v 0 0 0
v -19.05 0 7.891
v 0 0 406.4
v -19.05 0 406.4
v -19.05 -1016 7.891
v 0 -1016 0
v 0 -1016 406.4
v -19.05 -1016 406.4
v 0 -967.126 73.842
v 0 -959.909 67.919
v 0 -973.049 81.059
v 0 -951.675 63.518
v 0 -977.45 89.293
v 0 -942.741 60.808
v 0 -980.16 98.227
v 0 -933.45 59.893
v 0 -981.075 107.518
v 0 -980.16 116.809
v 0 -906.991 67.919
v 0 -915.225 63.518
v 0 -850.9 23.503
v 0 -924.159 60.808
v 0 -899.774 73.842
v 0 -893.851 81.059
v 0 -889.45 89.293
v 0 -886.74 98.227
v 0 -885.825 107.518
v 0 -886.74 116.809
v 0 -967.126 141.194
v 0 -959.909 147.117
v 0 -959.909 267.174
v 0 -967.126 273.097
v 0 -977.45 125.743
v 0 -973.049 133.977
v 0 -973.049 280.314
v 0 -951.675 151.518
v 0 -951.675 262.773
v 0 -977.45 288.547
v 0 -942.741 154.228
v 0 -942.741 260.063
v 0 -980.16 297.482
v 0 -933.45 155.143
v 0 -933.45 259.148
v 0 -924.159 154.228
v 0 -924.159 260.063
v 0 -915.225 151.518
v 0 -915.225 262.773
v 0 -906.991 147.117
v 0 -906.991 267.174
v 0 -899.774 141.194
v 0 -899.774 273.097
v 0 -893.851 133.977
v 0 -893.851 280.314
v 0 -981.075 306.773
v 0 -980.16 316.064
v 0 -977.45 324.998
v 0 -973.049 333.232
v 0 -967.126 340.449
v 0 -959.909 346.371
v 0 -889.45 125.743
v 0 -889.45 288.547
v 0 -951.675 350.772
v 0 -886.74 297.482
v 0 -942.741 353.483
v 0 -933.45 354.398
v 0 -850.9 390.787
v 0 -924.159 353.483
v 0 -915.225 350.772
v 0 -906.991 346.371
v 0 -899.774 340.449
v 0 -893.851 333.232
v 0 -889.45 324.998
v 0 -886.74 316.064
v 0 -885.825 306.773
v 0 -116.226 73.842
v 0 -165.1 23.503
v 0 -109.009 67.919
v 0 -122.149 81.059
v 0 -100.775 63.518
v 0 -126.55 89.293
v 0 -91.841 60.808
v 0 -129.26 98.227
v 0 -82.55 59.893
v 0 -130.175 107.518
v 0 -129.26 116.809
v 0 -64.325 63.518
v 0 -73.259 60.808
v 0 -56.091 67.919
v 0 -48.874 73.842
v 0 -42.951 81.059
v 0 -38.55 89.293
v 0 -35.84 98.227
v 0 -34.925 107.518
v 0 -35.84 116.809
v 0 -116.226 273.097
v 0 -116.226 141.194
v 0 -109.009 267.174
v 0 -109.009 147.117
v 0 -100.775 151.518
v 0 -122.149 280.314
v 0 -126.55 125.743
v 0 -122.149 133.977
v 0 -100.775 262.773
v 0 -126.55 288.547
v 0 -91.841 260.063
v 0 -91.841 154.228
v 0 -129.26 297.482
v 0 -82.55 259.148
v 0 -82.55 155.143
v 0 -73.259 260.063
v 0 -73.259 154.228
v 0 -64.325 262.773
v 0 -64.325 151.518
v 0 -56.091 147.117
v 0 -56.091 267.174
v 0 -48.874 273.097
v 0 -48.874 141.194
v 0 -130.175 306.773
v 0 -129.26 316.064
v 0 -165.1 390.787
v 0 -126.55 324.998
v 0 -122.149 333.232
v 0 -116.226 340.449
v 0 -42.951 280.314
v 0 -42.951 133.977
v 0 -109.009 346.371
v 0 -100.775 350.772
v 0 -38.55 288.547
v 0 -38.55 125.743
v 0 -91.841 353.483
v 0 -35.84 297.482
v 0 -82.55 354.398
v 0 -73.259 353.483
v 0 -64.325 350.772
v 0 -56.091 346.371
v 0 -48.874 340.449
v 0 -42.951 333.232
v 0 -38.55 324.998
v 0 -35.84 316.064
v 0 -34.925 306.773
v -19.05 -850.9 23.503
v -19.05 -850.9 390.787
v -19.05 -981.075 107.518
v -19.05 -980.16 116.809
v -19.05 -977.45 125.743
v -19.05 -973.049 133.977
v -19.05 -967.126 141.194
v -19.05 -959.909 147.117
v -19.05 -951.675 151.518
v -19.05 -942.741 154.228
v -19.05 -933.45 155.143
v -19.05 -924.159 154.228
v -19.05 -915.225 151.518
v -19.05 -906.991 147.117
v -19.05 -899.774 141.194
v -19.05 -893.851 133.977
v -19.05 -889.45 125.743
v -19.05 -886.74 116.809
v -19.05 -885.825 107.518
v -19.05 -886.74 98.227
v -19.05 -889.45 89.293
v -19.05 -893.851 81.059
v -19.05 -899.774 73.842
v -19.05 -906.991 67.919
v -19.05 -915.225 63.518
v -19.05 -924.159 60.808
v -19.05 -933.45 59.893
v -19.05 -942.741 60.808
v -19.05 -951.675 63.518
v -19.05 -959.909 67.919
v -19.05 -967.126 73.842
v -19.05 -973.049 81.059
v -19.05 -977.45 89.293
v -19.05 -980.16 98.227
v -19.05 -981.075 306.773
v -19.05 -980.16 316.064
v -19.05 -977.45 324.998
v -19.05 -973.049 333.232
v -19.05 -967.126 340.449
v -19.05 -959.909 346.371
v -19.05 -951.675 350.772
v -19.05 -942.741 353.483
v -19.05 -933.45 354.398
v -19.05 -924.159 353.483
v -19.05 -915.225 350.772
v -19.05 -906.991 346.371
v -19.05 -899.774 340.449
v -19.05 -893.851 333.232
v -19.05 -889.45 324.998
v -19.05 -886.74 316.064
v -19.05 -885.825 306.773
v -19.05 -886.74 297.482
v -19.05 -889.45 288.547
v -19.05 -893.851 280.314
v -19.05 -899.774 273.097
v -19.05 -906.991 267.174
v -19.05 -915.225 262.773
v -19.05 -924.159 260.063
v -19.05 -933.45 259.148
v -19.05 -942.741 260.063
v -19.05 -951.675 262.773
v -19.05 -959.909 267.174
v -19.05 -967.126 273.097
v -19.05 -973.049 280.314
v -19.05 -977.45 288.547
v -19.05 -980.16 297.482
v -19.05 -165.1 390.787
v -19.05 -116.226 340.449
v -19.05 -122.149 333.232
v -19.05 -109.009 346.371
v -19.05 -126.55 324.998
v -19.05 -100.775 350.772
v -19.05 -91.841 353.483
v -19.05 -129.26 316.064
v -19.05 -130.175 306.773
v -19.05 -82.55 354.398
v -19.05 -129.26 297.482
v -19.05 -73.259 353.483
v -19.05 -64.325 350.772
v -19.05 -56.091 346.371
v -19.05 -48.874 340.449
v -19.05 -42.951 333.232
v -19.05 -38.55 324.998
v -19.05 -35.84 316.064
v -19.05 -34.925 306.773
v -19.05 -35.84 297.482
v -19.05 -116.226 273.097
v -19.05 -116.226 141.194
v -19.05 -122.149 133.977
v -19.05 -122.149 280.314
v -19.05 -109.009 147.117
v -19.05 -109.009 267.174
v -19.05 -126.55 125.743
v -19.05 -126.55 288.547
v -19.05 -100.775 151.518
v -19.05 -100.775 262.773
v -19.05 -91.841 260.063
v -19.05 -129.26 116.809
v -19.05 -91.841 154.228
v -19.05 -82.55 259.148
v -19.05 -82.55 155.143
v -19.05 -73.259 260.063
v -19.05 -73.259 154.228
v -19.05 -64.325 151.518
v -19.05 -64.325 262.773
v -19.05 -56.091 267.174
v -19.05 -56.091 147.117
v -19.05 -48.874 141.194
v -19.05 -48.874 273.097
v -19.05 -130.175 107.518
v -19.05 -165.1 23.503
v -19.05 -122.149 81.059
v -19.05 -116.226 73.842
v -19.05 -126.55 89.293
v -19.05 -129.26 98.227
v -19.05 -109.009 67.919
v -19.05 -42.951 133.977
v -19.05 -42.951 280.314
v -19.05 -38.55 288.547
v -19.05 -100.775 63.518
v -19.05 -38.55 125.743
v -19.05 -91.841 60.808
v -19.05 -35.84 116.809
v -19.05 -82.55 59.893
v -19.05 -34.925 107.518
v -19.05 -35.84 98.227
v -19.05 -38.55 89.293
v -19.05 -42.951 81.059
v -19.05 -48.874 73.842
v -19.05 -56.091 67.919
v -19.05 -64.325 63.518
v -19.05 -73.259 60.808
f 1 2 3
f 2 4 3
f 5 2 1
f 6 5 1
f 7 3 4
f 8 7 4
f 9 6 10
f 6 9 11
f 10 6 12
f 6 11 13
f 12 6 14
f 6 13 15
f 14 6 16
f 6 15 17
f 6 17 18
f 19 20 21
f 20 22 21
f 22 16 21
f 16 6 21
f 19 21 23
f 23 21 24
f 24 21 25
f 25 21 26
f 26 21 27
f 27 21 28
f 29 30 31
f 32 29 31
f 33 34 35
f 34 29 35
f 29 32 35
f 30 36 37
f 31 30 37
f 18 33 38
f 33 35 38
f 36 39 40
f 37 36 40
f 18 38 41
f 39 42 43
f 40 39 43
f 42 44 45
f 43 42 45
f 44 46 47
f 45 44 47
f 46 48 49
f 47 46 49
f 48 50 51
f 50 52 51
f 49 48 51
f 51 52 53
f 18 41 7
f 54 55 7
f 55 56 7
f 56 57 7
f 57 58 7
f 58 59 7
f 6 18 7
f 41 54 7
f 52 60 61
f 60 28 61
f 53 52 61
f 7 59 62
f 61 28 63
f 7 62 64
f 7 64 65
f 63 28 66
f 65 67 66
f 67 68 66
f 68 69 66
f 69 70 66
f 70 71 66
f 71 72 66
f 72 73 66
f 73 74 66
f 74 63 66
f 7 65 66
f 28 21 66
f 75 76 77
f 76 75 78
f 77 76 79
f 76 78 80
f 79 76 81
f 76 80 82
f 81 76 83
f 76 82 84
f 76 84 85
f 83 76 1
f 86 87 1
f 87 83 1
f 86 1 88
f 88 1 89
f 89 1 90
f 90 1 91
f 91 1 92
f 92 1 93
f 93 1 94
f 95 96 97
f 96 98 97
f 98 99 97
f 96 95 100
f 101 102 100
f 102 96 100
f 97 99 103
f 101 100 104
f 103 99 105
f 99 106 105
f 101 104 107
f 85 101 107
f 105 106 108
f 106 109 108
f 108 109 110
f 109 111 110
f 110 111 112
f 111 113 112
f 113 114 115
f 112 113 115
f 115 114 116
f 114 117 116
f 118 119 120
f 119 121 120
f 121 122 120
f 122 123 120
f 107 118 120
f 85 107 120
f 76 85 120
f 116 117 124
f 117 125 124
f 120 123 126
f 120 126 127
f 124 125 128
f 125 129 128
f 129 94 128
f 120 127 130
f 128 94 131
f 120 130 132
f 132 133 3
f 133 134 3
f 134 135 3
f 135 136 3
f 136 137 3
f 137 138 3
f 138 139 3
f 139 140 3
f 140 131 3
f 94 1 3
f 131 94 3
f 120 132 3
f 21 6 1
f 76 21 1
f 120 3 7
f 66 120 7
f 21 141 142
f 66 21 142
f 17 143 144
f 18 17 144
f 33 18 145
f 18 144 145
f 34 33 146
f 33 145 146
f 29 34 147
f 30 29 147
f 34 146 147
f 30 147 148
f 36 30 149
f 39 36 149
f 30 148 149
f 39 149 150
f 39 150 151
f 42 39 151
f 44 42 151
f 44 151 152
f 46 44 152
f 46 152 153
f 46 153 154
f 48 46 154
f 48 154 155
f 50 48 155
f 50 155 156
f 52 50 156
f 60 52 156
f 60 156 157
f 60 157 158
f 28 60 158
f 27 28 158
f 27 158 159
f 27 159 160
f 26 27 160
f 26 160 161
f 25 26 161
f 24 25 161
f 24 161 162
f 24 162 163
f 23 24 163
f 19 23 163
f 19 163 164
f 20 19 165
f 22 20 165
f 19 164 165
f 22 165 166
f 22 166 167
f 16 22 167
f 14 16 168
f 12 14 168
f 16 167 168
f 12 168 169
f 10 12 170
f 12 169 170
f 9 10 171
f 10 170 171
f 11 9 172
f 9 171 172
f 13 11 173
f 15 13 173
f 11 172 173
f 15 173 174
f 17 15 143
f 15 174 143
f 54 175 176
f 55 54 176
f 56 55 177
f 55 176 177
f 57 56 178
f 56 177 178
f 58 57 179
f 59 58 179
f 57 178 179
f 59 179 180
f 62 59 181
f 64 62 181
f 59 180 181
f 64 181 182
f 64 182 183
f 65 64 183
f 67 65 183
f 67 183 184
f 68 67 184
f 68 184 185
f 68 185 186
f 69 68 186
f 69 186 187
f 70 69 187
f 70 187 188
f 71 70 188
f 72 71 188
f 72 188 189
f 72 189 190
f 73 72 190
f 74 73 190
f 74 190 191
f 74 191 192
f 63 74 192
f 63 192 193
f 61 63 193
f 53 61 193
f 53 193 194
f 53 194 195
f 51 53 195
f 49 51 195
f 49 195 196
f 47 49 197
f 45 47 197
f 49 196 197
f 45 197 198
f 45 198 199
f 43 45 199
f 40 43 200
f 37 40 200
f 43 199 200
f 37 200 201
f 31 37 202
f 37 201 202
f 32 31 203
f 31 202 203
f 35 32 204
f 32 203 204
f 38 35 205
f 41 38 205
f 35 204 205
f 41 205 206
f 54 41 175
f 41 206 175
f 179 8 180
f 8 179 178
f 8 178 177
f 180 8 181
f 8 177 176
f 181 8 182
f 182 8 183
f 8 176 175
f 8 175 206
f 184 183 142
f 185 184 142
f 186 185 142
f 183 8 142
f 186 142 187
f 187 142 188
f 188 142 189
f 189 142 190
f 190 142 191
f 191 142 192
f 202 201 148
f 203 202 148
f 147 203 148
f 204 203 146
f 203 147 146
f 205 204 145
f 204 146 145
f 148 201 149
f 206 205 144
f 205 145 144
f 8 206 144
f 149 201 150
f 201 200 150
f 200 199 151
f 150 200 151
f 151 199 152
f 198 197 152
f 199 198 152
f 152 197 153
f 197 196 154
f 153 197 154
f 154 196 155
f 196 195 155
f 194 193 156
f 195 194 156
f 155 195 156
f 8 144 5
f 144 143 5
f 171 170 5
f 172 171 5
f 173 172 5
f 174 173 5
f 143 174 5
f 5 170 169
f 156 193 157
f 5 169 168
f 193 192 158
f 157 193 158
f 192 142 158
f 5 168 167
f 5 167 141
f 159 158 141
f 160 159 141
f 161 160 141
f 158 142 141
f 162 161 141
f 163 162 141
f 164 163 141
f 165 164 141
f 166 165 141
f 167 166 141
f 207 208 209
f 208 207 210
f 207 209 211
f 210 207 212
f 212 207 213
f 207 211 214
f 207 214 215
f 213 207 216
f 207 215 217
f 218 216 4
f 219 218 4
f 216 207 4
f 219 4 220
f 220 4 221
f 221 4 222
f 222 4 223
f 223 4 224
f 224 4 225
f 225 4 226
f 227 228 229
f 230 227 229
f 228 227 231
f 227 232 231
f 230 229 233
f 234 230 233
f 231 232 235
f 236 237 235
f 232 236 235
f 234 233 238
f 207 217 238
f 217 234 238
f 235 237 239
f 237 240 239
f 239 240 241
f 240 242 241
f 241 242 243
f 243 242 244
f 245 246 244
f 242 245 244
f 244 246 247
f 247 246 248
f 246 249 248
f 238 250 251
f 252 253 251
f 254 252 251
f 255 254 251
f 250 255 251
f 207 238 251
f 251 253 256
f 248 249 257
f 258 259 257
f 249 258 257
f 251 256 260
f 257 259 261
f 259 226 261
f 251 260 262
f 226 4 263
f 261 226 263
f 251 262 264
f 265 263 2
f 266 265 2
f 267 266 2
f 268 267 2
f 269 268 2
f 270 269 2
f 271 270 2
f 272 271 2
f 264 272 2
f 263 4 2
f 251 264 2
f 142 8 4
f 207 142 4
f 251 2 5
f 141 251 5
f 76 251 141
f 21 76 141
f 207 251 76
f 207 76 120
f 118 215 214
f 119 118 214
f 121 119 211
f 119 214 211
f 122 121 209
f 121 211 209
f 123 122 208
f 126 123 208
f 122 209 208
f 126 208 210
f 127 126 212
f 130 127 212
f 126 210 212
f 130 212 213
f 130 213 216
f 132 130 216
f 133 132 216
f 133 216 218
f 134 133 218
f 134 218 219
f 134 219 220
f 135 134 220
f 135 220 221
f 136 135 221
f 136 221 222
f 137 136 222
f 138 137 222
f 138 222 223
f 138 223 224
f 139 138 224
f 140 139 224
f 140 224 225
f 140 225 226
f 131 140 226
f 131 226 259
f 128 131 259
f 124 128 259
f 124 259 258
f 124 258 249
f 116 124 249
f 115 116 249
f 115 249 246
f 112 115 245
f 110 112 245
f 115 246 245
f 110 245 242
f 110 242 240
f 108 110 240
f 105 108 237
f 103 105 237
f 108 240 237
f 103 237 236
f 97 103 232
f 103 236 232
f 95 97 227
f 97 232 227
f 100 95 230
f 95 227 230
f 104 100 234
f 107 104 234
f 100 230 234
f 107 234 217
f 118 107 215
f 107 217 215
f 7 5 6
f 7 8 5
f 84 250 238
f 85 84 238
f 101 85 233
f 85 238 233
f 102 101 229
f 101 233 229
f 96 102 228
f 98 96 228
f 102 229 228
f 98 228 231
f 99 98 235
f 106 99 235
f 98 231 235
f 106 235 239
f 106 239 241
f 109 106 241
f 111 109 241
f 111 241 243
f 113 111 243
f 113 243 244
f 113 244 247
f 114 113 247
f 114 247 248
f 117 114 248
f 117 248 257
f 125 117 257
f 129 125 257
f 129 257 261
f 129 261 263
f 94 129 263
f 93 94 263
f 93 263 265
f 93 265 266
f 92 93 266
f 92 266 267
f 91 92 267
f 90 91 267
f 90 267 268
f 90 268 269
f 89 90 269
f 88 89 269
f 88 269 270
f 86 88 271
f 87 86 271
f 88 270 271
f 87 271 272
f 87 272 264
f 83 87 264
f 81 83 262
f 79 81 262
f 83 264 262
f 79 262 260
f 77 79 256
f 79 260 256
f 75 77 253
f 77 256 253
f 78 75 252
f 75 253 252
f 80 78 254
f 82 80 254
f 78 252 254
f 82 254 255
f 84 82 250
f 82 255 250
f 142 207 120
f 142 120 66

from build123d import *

# Parameters (mm, degrees)
F1_DEPTH = 1016
F2_W     = 685.8
F2_H     = 367.284
F3_DEPTH = 19.051
F4_R     = 47.625
F5_DEPTH = 19.051


with BuildPart() as f1:
    # F0 (on Front) → F1 (new body)
    with BuildSketch(Plane.XZ):
        Polygon((-19.05, 7.890768), (0, 0), (0, 406.4), (-19.05, 406.4), align=None)
    extrude(amount=F1_DEPTH)

    # F2 (on face) → F3 (cut, through all)
    with BuildSketch(Plane(origin=(-19.05, 0, 0), x_dir=(0, -1, 0), z_dir=(-1, 0, 0))):
        with Locations((508, 207.145384)):
            Rectangle(F2_W, F2_H)
    extrude(amount=-F3_DEPTH, mode=Mode.SUBTRACT)

    # F4 (on face) → F5 (cut, through all)
    with BuildSketch(Plane(origin=(-19.05, 0, 0), x_dir=(0, -1, 0), z_dir=(-1, 0, 0))):
        with Locations((82.55, 306.772692)):
            Circle(F4_R)
        with Locations((82.55, 107.518076)):
            Circle(F4_R)
        with Locations((933.45, 306.772692)):
            Circle(F4_R)
        with Locations((933.45, 107.518076)):
            Circle(F4_R)
    extrude(amount=-F5_DEPTH, mode=Mode.SUBTRACT)


solid = f1.part
